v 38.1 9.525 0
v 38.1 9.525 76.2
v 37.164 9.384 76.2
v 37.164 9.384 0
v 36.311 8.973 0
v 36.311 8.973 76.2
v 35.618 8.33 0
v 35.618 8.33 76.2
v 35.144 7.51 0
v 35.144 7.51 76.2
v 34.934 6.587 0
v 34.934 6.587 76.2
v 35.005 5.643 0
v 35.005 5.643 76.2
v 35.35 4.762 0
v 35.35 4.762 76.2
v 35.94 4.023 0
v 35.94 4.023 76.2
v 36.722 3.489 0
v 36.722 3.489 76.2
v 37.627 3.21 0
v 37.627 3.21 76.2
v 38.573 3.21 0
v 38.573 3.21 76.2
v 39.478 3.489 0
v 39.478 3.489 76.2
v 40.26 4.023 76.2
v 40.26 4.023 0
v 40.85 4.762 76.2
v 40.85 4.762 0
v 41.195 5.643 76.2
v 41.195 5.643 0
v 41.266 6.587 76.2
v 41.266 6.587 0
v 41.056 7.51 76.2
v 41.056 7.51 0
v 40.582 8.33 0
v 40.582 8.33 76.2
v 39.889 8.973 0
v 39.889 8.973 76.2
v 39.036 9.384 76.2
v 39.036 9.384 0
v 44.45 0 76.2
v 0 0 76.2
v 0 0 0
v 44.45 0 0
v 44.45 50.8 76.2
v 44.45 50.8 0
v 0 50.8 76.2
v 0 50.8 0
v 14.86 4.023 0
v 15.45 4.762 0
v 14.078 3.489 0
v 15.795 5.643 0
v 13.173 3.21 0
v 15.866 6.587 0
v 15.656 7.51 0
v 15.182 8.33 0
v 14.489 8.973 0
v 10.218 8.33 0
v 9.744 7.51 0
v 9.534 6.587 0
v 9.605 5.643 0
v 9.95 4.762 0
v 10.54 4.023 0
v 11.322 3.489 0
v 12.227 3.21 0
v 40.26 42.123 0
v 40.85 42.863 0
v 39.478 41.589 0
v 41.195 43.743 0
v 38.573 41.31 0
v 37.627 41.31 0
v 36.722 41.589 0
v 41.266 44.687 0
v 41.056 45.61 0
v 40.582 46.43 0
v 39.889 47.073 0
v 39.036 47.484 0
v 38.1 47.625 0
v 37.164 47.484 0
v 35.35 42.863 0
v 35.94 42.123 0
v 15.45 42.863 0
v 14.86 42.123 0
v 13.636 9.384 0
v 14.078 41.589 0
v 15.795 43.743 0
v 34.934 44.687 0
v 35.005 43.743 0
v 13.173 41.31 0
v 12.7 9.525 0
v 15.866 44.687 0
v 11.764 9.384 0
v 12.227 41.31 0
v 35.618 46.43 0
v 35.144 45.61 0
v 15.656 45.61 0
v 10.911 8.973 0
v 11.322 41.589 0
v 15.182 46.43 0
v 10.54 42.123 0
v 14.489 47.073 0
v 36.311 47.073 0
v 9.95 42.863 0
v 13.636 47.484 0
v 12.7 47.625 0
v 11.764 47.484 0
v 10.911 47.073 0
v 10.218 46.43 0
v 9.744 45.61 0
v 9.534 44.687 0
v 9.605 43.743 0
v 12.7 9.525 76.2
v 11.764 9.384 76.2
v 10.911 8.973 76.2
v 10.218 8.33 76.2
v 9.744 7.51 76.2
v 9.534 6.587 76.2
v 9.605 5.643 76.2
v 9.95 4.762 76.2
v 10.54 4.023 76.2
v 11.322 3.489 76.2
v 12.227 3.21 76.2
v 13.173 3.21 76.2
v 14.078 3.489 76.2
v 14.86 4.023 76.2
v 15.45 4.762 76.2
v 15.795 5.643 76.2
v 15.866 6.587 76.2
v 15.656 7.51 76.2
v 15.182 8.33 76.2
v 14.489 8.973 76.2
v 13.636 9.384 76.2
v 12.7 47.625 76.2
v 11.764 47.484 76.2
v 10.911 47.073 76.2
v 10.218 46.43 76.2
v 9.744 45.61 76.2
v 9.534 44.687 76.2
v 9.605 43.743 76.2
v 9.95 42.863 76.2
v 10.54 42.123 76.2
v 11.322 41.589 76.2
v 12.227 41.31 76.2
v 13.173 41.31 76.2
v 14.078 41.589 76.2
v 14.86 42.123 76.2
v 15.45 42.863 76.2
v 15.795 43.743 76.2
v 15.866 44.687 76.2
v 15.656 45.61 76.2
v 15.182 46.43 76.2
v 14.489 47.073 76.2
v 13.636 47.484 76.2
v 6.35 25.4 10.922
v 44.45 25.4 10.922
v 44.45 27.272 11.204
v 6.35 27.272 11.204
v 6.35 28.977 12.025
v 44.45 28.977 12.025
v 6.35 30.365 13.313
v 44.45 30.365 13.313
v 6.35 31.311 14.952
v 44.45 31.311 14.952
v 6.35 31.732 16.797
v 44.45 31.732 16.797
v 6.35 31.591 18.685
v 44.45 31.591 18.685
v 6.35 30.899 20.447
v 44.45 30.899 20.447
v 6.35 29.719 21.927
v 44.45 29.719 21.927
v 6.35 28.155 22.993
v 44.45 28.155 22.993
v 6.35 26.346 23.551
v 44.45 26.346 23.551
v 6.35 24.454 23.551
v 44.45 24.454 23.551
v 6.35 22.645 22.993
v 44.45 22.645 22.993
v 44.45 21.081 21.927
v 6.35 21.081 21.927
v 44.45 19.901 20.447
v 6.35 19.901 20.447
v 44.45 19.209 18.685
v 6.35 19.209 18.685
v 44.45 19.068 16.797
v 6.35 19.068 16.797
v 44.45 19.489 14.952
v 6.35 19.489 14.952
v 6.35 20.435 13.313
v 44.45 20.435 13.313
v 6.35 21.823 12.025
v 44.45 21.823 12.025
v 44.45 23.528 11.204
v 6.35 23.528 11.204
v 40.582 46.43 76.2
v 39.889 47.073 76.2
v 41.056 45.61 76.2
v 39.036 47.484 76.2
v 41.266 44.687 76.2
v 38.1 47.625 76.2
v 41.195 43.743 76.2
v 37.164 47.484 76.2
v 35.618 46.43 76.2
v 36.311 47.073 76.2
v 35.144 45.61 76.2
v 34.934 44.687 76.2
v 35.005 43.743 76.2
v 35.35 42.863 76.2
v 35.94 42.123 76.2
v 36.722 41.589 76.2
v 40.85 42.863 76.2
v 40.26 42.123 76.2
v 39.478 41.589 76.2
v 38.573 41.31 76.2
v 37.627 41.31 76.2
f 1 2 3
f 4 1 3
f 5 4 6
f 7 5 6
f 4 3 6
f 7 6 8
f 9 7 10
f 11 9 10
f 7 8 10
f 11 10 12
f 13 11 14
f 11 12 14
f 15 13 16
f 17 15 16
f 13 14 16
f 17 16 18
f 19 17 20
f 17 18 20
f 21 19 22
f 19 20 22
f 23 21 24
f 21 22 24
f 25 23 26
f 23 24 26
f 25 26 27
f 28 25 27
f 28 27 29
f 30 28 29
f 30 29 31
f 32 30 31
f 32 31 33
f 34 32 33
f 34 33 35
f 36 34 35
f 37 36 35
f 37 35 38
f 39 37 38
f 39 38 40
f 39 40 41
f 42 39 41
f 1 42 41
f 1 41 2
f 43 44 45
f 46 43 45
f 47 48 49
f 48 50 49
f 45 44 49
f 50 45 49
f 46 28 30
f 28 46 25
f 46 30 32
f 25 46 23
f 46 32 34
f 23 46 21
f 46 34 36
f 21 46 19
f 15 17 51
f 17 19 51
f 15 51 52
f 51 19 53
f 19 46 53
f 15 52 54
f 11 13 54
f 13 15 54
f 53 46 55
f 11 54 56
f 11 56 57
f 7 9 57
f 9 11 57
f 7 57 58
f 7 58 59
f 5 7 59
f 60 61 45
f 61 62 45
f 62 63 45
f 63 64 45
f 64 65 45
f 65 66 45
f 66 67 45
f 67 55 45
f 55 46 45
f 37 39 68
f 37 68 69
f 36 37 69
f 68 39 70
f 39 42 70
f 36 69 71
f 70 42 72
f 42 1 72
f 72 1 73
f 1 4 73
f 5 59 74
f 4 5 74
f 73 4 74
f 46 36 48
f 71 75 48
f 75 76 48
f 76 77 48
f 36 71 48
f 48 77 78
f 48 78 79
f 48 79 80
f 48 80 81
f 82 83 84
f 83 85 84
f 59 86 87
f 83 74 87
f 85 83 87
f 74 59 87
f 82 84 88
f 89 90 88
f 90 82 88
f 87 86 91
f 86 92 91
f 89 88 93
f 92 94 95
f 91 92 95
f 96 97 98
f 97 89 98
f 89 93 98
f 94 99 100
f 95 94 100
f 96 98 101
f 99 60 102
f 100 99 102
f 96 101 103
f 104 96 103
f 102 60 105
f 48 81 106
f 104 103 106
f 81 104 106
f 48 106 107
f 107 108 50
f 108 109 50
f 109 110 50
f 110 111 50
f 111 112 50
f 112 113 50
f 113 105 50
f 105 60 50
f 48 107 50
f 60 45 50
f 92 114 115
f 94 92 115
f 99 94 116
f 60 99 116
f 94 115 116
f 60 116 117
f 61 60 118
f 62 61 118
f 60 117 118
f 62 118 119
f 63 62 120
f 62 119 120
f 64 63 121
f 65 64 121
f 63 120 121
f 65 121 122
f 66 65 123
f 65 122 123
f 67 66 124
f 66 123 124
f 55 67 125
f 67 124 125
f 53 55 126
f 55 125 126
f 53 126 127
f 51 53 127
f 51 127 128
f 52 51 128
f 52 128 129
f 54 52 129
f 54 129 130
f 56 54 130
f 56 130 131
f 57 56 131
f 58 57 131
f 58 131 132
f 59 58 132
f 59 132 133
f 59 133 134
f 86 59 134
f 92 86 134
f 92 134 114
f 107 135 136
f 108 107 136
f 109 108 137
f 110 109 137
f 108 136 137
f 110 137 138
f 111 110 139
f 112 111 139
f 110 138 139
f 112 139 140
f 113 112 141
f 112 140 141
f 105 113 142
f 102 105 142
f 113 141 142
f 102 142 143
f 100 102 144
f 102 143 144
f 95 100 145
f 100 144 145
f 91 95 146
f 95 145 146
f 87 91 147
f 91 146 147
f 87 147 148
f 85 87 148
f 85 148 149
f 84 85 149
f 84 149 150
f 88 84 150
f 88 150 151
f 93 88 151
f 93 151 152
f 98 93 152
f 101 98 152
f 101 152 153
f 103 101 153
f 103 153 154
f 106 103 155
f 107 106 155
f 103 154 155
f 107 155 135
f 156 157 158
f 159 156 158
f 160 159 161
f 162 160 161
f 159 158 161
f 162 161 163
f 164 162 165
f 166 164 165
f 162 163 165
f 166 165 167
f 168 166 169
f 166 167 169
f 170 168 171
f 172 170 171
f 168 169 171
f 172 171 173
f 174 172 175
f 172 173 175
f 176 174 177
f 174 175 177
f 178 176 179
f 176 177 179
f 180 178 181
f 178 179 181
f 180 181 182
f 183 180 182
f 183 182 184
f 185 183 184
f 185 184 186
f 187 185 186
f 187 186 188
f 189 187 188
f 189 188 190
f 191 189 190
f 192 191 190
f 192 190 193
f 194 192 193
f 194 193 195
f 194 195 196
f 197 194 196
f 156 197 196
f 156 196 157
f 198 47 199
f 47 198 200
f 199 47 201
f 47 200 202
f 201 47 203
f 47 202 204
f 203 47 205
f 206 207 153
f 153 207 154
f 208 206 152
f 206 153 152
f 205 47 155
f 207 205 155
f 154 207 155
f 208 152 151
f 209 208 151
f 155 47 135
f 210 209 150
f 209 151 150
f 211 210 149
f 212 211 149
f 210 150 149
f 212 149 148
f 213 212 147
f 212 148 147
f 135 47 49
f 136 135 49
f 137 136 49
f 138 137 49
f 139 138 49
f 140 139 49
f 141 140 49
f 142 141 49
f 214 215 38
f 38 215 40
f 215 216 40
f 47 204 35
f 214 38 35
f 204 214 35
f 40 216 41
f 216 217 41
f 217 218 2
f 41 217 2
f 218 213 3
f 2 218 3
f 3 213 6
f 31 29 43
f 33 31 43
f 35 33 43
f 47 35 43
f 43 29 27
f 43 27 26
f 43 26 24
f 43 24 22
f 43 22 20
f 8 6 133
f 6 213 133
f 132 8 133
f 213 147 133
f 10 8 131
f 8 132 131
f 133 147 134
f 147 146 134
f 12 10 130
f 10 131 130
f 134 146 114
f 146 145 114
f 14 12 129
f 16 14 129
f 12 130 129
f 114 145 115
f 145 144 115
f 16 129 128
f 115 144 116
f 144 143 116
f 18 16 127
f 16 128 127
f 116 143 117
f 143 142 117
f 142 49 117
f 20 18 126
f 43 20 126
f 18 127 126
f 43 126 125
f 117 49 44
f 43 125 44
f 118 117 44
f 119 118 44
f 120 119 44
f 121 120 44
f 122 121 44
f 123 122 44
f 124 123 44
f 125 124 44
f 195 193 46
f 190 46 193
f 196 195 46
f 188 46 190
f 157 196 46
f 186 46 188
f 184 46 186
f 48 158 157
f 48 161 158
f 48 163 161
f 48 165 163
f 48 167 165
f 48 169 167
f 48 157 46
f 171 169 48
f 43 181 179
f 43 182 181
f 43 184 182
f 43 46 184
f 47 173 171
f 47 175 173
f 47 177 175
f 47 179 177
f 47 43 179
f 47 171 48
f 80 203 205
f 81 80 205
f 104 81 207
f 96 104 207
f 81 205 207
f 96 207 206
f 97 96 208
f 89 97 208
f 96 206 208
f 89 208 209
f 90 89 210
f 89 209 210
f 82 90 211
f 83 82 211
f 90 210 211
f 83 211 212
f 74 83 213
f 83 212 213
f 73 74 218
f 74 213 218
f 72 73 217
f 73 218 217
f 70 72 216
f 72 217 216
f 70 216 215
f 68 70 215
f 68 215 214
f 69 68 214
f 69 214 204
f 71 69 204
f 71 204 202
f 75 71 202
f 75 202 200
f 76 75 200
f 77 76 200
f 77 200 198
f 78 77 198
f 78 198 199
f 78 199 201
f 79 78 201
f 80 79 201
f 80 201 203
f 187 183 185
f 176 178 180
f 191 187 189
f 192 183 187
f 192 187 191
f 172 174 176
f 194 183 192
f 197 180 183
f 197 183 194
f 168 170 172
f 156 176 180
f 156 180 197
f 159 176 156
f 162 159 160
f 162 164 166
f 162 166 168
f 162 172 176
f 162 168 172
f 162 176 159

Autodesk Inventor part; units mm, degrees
ref_plane "YZ Plane" through (0, 0, 0) normal (1, 0, 0) x (0, 1, 0)
ref_plane "XZ Plane" through (0, 0, 0) normal (0, 1, 0) x (-1, 0, 0)
ref_plane "XY Plane" through (0, 0, 0) normal (0, 0, 1) x (1, 0, 0)
sketch "Sketch1" plane through (0, 0, 0) normal (1, 0, 0) x (0, 1, 0)
  line L0 (0, 0) -> (50.8, 0)
  line L1 (50.8, 0) -> (50.8, 76.2)
  line L2 (50.8, 76.2) -> (0, 76.2)
  line L3 (0, 76.2) -> (0, 0)
  dimension "d0" = 76.2
  dimension "d1" = 50.8
extrude "Extrusion1" add sketch "Sketch1" along normal blind 44.45
sketch "Sketch2" plane through (44.45, 0, 0) normal (1, 0, 0) x (0, 0, -1)
  line L0 (0, 50.8) -> (-76.2, 50.8) projected
  line L1 (-76.2, 50.8) -> (-76.2, 0) projected
  circle A0 centre (-17.272, 25.4) radius 6.35
  dimension "d4" = 12.7
  dimension "d5" = 25.4
  dimension "d6" = 58.928
extrude "Extrusion2" cut sketch "Sketch2" against normal blind 38.1
sketch "Sketch3" plane through (0, 0, 0) normal (0, 0, -1) x (-1, 0, 0)
  line L0 (0, 0) -> (0, 50.8) projected
  line L1 (0, 50.8) -> (-44.45, 50.8) projected
  line L2 (-44.45, 0) -> (-44.45, 50.8) projected
  line L3 (0, 0) -> (-44.45, 0) projected
  point P0 (-38.1, 44.45)
  point P1 (-12.7, 44.45)
  point P2 (-12.7, 6.35)
  point P3 (-38.1, 6.35)
  dimension "d9" = 6.35
  dimension "d10" = 6.35
  dimension "d11" = 6.35
  dimension "d12" = 12.7
  dimension "d13" = 12.7
  dimension "d14" = 6.35
  dimension "d15" = 6.35
  dimension "d16" = 6.35
hole "Hole1" at (38.1, 44.45, 0) at (12.7, 44.45, 0) at (12.7, 6.35, 0) at (38.1, 6.35, 0) direction (0, 0, 1) diameter 6.35 end through all
properties part number "Linear Bearing"
